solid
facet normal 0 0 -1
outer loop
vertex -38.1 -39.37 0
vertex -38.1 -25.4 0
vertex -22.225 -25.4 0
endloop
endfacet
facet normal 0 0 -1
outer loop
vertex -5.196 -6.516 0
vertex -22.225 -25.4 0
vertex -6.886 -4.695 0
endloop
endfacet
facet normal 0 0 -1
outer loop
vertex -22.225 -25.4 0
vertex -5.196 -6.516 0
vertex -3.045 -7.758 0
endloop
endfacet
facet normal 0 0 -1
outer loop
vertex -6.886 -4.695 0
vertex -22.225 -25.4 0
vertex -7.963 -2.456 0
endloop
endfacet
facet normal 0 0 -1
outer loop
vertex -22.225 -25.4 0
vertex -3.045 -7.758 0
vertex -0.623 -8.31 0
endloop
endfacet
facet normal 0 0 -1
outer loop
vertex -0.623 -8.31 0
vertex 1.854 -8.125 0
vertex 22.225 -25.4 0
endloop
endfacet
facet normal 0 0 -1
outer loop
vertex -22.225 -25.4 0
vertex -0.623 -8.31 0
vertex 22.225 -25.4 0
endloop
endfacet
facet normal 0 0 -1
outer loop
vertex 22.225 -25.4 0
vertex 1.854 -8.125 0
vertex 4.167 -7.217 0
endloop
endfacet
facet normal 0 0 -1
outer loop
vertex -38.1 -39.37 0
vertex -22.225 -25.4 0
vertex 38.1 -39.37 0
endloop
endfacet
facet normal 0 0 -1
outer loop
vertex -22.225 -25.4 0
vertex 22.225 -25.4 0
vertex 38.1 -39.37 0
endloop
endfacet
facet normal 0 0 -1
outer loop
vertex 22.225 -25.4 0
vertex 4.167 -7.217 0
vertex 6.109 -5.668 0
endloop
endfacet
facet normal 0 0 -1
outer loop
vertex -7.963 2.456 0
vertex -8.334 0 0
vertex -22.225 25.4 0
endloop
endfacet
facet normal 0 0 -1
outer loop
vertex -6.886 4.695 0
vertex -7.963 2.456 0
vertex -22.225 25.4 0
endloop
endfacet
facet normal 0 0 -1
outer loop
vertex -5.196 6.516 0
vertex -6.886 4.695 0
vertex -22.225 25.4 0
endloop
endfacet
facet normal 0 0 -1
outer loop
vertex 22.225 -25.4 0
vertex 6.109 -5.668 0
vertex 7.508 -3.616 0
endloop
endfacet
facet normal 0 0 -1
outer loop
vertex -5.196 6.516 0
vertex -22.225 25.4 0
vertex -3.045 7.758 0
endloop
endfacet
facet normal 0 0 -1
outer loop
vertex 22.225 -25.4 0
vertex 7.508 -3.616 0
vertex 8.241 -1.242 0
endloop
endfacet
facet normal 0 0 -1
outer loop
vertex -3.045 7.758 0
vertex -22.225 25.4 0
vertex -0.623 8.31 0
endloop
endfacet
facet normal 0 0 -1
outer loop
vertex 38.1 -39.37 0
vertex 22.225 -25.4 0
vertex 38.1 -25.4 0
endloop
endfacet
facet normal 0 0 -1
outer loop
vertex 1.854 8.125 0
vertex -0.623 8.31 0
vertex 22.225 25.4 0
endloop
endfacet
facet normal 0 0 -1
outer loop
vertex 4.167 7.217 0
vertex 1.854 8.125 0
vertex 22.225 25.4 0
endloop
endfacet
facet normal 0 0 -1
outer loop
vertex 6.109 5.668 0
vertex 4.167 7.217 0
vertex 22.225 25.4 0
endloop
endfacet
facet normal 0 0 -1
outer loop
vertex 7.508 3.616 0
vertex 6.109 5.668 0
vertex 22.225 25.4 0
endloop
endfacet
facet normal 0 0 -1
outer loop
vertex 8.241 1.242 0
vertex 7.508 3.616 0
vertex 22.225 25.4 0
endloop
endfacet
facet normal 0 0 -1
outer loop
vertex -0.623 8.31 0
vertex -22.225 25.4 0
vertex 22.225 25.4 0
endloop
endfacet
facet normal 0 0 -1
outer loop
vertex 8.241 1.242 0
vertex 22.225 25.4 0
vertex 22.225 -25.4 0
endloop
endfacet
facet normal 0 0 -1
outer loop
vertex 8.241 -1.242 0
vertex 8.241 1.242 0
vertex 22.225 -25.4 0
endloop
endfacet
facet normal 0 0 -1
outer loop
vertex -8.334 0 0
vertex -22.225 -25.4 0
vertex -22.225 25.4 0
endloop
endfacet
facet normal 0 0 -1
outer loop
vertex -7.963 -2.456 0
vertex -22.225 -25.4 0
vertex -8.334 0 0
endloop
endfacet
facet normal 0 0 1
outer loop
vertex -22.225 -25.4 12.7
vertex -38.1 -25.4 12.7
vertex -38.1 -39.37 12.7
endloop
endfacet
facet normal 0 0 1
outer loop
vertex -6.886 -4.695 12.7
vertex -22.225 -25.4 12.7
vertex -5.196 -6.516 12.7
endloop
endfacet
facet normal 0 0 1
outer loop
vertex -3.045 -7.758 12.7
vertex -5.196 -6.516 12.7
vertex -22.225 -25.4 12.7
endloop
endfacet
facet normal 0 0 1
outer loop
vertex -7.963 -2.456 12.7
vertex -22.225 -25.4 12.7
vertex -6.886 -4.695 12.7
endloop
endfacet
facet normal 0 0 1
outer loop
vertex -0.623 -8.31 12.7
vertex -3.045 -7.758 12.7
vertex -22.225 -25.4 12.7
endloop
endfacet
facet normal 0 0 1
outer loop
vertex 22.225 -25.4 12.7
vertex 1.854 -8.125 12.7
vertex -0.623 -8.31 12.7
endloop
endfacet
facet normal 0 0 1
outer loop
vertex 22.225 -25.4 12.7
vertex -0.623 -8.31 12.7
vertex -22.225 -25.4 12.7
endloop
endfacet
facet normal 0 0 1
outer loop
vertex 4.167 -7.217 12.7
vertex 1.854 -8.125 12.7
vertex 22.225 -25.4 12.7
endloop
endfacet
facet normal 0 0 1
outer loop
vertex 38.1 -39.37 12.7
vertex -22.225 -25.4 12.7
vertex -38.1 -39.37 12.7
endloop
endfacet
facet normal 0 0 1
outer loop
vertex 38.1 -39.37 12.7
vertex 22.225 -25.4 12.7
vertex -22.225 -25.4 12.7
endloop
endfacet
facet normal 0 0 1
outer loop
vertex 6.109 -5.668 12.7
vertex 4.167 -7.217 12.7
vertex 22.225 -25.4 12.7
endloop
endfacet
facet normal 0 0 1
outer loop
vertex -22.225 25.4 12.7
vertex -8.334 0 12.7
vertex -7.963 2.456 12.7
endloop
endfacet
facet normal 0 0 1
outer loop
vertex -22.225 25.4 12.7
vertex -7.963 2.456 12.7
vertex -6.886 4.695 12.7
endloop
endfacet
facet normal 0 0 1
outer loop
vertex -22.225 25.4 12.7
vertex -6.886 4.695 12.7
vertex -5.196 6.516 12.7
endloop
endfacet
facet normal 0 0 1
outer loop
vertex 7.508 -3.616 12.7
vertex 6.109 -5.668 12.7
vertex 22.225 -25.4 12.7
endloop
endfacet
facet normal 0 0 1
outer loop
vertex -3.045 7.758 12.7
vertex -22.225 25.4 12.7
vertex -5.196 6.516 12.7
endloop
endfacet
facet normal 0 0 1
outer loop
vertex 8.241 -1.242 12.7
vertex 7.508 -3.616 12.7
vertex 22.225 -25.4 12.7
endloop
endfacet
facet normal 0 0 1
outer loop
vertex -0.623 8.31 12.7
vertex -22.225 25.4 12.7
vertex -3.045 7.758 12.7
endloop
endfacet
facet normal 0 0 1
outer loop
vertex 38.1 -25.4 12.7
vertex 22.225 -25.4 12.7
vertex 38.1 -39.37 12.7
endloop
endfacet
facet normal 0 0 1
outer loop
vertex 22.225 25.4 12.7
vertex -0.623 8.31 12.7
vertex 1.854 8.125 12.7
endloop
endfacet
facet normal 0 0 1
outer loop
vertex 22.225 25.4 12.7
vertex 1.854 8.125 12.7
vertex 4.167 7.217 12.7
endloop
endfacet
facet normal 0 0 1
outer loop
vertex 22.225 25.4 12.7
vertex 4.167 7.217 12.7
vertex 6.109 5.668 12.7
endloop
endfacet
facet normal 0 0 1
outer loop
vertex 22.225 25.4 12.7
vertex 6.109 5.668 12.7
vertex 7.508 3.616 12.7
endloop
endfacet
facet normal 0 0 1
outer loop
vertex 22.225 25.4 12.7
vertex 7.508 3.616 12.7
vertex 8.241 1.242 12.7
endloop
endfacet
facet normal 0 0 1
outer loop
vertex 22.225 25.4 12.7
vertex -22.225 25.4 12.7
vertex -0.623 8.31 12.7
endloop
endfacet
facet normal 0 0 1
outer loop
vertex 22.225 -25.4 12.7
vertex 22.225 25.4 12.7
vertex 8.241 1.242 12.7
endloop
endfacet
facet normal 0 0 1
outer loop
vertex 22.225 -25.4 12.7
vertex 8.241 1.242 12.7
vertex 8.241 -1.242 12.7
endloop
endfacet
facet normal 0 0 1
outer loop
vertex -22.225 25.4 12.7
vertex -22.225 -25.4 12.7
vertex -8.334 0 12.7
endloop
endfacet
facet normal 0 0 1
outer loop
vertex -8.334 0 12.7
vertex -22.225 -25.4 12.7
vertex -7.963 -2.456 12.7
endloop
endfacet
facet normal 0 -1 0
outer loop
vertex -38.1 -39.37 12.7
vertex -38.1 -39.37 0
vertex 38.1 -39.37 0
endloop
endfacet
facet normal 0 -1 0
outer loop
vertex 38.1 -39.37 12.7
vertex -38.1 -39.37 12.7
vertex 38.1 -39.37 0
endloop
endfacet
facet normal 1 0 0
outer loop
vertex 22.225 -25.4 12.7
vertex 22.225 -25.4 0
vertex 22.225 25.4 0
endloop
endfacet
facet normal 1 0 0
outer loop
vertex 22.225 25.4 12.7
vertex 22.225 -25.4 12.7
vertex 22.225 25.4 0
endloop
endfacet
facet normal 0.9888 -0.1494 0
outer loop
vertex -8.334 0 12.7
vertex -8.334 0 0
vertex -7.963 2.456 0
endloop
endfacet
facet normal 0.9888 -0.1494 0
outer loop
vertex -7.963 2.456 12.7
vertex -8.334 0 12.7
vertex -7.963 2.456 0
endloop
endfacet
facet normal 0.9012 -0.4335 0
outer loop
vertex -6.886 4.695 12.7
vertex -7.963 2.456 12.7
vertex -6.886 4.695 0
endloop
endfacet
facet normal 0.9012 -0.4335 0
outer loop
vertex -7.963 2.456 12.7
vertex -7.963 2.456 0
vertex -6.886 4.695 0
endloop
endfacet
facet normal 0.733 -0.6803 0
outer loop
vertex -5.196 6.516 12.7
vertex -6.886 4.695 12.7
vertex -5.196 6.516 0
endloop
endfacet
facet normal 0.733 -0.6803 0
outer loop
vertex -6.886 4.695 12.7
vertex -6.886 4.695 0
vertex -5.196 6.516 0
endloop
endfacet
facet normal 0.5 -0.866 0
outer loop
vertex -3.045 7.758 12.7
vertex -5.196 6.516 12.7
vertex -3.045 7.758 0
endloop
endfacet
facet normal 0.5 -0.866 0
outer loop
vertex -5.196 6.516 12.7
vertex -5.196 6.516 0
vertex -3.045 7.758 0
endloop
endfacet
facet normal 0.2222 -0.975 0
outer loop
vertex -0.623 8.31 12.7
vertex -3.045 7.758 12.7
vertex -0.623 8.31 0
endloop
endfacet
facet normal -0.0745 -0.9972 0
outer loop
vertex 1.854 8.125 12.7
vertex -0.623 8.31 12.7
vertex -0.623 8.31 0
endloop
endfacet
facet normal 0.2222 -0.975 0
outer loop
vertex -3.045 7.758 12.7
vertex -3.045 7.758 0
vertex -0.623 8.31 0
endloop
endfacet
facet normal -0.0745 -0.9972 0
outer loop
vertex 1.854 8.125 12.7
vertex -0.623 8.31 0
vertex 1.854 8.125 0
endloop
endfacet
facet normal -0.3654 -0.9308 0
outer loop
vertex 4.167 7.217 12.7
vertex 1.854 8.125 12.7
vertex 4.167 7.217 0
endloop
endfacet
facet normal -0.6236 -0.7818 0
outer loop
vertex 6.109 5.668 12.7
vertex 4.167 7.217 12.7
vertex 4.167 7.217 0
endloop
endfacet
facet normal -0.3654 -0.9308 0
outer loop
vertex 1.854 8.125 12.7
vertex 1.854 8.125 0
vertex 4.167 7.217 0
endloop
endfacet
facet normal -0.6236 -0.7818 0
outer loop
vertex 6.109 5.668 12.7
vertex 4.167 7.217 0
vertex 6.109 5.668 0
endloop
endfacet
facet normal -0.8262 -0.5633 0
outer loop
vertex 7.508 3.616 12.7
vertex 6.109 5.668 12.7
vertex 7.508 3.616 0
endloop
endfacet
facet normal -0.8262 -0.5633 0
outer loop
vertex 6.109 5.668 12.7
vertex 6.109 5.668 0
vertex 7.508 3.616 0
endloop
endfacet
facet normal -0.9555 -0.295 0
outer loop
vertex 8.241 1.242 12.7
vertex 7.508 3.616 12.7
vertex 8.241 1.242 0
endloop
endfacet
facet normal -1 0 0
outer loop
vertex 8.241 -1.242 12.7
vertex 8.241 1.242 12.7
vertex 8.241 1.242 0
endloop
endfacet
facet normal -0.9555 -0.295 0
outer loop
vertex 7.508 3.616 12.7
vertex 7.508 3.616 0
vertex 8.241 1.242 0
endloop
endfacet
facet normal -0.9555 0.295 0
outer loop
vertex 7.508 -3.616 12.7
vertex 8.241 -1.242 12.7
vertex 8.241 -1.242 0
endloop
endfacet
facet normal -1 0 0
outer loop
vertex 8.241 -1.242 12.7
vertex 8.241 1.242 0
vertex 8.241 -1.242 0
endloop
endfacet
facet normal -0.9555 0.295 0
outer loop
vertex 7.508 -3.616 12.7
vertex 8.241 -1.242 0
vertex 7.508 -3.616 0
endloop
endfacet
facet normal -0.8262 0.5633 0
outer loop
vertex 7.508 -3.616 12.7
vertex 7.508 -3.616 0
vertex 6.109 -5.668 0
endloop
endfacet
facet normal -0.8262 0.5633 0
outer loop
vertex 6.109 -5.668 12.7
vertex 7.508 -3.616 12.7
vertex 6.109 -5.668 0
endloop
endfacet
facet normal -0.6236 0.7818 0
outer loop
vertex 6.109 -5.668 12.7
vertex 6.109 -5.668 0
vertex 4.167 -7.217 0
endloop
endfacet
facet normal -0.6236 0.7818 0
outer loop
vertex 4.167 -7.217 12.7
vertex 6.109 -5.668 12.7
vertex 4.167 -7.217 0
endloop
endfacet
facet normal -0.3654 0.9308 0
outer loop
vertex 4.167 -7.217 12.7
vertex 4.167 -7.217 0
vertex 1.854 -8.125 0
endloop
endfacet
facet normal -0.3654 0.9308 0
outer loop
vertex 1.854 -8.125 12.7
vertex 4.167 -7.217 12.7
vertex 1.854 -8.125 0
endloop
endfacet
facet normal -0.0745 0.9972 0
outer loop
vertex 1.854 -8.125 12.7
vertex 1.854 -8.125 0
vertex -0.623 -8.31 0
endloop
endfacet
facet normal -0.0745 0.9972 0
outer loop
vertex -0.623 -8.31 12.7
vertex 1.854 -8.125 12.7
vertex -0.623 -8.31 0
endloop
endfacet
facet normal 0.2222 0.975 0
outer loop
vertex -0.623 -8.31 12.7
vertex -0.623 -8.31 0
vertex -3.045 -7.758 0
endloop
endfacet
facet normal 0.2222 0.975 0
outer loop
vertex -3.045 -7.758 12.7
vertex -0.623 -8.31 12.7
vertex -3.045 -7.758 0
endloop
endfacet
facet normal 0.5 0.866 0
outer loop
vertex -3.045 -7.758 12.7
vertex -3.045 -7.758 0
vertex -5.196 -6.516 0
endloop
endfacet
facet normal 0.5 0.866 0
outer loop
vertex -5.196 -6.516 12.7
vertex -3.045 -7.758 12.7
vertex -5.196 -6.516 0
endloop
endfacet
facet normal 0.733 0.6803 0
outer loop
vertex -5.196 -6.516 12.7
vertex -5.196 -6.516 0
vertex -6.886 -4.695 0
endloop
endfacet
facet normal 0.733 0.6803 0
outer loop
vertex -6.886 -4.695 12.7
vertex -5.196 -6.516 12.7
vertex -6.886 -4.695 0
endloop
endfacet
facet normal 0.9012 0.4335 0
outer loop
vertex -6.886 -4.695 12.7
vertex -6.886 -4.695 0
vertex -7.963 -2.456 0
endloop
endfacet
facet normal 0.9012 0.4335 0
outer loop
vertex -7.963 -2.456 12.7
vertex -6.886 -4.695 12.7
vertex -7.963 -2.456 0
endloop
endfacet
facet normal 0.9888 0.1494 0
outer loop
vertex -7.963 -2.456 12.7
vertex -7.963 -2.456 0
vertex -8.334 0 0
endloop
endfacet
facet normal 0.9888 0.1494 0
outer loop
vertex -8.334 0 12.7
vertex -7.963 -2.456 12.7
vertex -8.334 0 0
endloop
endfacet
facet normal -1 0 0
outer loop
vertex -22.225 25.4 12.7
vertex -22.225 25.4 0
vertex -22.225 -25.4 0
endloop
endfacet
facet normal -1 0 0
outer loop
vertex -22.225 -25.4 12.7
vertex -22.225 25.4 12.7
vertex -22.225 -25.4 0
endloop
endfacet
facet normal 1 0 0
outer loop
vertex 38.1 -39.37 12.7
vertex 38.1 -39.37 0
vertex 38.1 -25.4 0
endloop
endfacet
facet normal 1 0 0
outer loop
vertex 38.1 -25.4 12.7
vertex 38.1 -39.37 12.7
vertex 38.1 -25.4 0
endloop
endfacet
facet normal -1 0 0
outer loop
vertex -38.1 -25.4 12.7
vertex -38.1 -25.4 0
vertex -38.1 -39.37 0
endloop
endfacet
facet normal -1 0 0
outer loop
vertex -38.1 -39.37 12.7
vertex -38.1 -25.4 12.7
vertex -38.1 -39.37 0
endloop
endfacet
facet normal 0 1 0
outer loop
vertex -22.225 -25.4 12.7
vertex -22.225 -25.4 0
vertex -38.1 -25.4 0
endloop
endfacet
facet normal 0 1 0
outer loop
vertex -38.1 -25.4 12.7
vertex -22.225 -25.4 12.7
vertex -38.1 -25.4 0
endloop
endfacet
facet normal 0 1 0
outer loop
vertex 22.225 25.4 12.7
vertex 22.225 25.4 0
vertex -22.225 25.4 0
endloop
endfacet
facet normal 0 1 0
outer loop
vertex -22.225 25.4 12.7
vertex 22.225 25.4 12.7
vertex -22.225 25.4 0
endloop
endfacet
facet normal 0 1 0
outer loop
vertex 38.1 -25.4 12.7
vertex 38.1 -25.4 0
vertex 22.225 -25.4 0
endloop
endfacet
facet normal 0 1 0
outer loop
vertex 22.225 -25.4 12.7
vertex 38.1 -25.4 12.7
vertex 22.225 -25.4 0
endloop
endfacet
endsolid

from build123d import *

# Parameters (mm, degrees)
F1_DEPTH = 12.7
F3_D     = 16.66748


with BuildPart() as f1:
    # F0 (on Top) → F1 (new body)
    with BuildSketch(Plane.XY):
        Polygon((22.225, -25.4), (22.225, 25.4), (-22.225, 25.4), (-22.225, -25.4), (-38.1, -25.4), (-38.1, -39.37), (38.1, -39.37), (38.1, -25.4), align=None)
    extrude(amount=F1_DEPTH)

    # F3 (through all)
    with Locations(Plane.XY.offset(12.7)):
        with Locations((0, 0)):
            Hole(F3_D / 2)


solid = f1.part
